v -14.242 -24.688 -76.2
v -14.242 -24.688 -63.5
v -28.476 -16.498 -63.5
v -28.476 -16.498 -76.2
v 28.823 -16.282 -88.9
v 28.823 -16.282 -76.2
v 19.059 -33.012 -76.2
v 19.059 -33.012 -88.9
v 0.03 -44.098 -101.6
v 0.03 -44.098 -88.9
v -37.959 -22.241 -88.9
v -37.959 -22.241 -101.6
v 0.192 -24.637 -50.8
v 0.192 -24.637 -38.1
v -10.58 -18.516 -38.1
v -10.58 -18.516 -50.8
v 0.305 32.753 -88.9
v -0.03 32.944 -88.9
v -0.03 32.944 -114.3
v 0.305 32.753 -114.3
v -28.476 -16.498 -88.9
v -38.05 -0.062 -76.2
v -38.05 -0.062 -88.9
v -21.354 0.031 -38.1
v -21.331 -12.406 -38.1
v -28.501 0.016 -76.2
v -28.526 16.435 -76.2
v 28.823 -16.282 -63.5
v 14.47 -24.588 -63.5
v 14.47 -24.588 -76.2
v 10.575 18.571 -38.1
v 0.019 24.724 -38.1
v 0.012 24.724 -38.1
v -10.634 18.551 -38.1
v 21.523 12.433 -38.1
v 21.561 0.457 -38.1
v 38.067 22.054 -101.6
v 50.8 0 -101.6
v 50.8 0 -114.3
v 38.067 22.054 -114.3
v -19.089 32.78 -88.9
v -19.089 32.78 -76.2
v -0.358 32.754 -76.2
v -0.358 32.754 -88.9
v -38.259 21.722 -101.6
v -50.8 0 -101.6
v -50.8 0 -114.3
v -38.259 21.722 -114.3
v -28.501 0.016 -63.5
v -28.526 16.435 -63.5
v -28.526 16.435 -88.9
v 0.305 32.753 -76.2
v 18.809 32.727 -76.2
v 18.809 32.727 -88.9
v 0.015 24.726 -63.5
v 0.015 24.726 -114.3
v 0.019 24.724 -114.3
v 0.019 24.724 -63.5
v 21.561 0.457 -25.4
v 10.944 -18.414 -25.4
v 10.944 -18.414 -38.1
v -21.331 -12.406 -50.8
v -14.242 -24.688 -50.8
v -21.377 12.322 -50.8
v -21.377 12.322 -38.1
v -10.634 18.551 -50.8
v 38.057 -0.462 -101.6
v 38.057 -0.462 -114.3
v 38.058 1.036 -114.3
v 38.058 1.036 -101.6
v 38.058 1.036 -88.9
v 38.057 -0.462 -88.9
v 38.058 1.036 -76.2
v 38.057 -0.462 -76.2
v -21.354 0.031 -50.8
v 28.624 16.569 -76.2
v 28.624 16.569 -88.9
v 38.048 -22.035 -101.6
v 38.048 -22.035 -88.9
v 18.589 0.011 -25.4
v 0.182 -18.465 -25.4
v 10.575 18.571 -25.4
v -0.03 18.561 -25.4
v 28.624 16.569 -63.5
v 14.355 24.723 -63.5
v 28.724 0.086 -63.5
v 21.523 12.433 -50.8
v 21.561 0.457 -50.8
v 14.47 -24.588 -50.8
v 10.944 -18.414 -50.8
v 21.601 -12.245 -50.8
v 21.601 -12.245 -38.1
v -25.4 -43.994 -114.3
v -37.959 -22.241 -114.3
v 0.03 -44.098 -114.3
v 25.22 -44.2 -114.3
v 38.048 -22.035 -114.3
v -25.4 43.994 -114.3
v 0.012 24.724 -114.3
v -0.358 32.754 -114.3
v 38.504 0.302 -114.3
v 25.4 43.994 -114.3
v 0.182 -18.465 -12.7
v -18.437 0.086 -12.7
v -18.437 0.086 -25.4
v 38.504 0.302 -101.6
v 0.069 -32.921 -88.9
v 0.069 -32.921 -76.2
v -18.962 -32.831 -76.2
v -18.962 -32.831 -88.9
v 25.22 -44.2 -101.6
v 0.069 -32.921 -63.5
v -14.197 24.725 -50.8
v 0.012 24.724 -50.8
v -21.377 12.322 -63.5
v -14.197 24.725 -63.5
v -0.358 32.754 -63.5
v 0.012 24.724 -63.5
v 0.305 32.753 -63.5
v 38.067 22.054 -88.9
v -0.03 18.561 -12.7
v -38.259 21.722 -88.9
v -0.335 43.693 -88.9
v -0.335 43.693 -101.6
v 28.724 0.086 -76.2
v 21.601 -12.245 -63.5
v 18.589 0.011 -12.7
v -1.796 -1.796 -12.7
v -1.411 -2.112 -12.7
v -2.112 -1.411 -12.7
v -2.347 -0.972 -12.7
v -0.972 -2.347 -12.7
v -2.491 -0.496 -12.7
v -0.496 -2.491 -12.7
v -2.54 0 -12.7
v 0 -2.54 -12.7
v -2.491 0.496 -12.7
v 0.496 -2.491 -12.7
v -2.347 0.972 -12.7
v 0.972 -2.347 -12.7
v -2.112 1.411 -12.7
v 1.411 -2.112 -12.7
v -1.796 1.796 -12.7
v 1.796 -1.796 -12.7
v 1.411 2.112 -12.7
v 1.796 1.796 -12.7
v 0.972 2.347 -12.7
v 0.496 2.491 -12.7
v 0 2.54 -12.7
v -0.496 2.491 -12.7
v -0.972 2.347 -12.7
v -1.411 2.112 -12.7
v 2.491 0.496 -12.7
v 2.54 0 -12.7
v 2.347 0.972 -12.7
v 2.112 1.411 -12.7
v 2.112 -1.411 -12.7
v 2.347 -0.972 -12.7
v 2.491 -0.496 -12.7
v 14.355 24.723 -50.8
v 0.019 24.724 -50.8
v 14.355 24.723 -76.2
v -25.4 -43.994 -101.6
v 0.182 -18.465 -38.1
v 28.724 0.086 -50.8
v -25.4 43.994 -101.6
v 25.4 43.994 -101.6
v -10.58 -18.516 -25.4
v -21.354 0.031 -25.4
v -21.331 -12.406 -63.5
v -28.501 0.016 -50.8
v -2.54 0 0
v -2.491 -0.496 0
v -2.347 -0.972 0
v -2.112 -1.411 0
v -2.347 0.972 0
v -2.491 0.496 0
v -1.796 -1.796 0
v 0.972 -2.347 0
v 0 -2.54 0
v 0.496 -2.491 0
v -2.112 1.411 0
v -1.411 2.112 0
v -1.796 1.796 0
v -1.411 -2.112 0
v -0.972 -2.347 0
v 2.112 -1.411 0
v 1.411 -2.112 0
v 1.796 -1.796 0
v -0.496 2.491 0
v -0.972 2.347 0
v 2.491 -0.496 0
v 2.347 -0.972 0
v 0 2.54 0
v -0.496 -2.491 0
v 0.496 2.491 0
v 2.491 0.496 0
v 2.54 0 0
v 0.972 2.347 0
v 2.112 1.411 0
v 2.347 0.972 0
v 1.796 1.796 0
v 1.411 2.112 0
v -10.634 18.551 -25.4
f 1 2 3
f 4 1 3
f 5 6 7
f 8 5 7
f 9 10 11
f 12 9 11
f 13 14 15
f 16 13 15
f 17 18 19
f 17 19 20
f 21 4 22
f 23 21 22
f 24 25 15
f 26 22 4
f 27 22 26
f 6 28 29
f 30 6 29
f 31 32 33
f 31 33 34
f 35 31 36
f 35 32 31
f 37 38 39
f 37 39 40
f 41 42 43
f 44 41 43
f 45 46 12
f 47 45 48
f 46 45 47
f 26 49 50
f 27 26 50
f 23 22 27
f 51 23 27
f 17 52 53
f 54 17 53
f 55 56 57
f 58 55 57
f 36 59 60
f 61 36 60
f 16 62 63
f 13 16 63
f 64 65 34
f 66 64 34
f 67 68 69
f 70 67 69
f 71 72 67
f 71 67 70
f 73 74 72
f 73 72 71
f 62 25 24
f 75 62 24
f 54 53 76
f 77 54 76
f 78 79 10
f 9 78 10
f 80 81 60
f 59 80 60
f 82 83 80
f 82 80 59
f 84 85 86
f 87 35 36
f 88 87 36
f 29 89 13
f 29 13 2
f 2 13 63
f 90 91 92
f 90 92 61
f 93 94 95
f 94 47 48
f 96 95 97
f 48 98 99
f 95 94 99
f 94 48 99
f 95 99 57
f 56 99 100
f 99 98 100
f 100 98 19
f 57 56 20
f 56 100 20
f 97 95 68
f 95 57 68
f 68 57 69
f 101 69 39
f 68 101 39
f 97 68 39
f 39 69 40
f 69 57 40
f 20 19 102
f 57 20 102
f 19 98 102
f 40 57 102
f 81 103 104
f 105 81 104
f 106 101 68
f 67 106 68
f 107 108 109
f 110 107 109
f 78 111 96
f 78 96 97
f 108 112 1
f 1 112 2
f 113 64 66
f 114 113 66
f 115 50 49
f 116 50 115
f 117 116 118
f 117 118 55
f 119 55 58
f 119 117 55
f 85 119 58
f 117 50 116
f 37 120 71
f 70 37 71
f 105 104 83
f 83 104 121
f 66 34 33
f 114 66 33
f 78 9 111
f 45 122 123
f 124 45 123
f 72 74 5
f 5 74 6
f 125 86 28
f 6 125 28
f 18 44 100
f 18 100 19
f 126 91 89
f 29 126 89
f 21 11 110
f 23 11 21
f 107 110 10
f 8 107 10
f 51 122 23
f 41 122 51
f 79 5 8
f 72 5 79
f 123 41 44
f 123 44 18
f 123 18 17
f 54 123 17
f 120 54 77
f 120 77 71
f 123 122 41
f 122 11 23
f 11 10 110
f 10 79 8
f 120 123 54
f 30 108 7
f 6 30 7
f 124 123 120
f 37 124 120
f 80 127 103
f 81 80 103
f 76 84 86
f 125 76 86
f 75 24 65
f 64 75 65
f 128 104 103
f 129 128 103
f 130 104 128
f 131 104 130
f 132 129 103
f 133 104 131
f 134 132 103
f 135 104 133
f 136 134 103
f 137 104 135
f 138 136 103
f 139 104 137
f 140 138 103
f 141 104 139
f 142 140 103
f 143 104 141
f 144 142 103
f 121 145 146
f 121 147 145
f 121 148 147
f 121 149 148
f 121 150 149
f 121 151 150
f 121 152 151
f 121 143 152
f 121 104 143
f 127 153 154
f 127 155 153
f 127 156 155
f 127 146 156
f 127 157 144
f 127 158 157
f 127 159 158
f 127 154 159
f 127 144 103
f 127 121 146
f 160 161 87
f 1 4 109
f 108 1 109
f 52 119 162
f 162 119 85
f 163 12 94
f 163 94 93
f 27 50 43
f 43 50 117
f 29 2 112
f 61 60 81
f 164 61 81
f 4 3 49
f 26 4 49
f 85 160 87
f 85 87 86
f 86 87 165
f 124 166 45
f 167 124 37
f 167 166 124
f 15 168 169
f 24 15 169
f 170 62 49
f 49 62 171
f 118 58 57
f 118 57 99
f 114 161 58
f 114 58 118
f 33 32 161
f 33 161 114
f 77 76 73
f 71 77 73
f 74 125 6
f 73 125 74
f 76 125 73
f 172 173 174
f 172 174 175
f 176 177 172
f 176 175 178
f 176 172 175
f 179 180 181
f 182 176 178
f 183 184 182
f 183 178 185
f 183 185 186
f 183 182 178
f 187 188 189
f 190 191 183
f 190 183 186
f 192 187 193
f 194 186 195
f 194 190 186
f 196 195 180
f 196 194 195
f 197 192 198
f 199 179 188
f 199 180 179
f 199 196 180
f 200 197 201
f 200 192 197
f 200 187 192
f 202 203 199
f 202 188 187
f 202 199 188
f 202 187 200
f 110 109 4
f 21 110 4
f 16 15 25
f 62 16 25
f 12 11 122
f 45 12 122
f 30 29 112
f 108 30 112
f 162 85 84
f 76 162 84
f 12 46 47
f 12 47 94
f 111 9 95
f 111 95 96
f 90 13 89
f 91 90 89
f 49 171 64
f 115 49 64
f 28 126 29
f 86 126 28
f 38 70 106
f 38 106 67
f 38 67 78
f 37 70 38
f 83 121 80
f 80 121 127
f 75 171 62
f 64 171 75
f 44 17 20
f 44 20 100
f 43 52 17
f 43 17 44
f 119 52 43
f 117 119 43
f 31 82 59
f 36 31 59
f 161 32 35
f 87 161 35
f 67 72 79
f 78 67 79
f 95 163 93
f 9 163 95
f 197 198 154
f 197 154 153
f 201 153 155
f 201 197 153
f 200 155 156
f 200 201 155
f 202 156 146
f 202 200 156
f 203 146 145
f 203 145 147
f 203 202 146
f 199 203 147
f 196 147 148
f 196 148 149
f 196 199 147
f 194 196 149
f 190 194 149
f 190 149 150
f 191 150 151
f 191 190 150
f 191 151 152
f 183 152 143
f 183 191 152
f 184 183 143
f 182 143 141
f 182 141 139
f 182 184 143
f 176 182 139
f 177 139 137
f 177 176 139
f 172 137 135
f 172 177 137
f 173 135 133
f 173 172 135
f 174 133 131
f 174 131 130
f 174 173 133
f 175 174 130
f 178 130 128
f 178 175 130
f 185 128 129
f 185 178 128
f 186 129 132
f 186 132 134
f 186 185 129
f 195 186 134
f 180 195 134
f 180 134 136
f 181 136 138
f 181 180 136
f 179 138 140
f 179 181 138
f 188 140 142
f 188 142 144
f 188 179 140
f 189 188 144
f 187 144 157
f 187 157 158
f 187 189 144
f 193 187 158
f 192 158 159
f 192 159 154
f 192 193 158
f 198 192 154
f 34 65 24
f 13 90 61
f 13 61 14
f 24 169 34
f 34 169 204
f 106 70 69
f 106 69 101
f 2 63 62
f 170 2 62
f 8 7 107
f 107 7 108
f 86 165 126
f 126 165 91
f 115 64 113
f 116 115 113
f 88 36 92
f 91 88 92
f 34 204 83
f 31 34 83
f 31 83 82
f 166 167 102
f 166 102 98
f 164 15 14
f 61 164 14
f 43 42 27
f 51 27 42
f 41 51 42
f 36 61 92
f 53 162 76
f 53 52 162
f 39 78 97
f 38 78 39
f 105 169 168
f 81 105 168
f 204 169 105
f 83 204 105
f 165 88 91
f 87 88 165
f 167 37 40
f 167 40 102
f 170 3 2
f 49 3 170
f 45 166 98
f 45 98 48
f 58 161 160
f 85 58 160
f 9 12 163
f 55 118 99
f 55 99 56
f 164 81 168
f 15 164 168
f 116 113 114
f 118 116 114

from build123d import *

# Parameters (mm, degrees)
F0_R     = 2.54
F1_DEPTH = 114.3
F2_DEPTH = 101.6
F3_DEPTH = 88.9
F4_DEPTH = 76.2
F5_DEPTH = 63.5
F6_DEPTH = 50.8
F7_DEPTH = 38.1
F8_DEPTH = 25.4
F9_DEPTH = 12.7


with BuildPart() as f1:
    # F0 (on Top) → F1 (new body)
    with BuildSketch(Plane.XY):
        Polygon((0.0297449546, -44.0977803999), (-37.9594102152, -22.2405539065), (-25.4, -43.9940905122), align=None)
        Polygon((38.0476643122, -22.0353334131), (0.0297449546, -44.0977803999), (25.2201944386, -44.2004945593), align=None)
        Polygon((-0.3350584157, 43.6933898381), (-38.2585494002, 21.7224296395), (-37.9594102152, -22.2405539065), (0.0297449546, -44.0977803999), (38.0476643122, -22.0353334131), (38.0572074327, -0.4624397172), (28.8234651499, -16.2822326428), (19.0586446504, -33.011900152), (0.0689860095, -32.9213402193), (-18.9618453465, -32.8305839378), (-28.4762239518, -16.497728885), (-38.0503063303, -0.0623833689), (-28.5255642951, 16.434953765), (-19.0890015805, 32.7795598355), (-0.3579905366, 32.7538269983), (-0.029694677, 32.9440250808), (0.3047047711, 32.7529165813), (18.8090625796, 32.7274951224), (28.6237113617, 16.568670808), (38.0578704177, 1.0362842578), (38.0671679073, 22.0539121087), align=None)
        Polygon((19.0586446504, -33.011900152), (28.8234651499, -16.2822326428), (14.47040053, -24.5877973202), (0.0689860095, -32.9213402193), align=None)
        Polygon((-18.9618453465, -32.8305839378), (0.0689860095, -32.9213402193), (-14.2417858933, -24.6875750467), (-28.4762239518, -16.497728885), align=None)
        Polygon((0.0689860095, -32.9213402193), (14.47040053, -24.5877973202), (0.1916506856, -24.6374174075), (-14.2417858933, -24.6875750467), align=None)
        Polygon((-14.2417858933, -24.6875750467), (0.1916506856, -24.6374174075), (-10.5802674086, -18.5155618092), (-21.3309908039, -12.4057515018), align=None)
        Polygon((-10.5802674086, -18.5155618092), (0.1916506856, -24.6374174075), (10.9436599796, -18.4137225871), (0.1816962855, -18.4646421982), align=None)
        Polygon((0.1916506856, -24.6374174075), (14.47040053, -24.5877973202), (21.6005177699, -12.2451052788), (10.9436599796, -18.4137225871), align=None)
        Polygon((10.9436599796, -18.4137225871), (21.6005177699, -12.2451052788), (21.5605416369, 0.4568982525), align=None)
        Polygon((10.9436599796, -18.4137225871), (21.5605416369, 0.4568982525), (10.5746748077, 18.5706432099), (-0.029694677, 18.5608677566), (18.5890194076, 0.010555068), (0.1816962855, -18.4646421982), align=None)
        Polygon((14.47040053, -24.5877973202), (28.8234651499, -16.2822326428), (28.7239362394, 0.0859907596), (21.6005177699, -12.2451052788), align=None)
        Polygon((21.6005177699, -12.2451052788), (28.7239362394, 0.0859907596), (21.5228505909, 12.4328389883), (21.5605416369, 0.4568982525), align=None)
        Polygon((38.0572074327, -0.4624397172), (38.0578704177, 1.0362842578), (28.6237113617, 16.568670808), (28.7239362394, 0.0859907596), (28.8234651499, -16.2822326428), align=None)
        Polygon((28.7239362394, 0.0859907596), (28.6237113617, 16.568670808), (14.3545600969, 24.7234572518), (21.5228505909, 12.4328389883), align=None)
        Polygon((14.3545600969, 24.7234572518), (28.6237113617, 16.568670808), (18.8090625796, 32.7274951224), (0.3047047711, 32.7529165813), align=None)
        Polygon((-28.5255642951, 16.434953765), (-0.3579905366, 32.7538269983), (-19.0890015805, 32.7795598355), align=None)
        Polygon((0.0185433098, 24.7241456127), (14.3545600969, 24.7234572518), (0.3047047711, 32.7529165813), (-0.3579905366, 32.7538269983), (-28.5255642951, 16.434953765), (-28.5009651241, 0.0160024937), (-21.37674811, 12.3222678023), (-14.1967849419, 24.7248281787), (0.0124332375, 24.7241459061), (0.0154661396, 24.7259044438), align=None)
        Polygon((-10.6340641617, 18.5510923033), (0.0124332375, 24.7241459061), (-14.1967849419, 24.7248281787), (-21.37674811, 12.3222678023), align=None)
        Polygon((-21.3540038347, 0.0308781616), (-10.6340641617, 18.5510923033), (-21.37674811, 12.3222678023), align=None)
        Polygon((-21.3540038347, 0.0308781616), (-10.5802674086, -18.5155618092), (0.1816962855, -18.4646421982), (-18.437017799, 0.0856704905), (-0.029694677, 18.5608677566), (-10.6340641617, 18.5510923033), align=None)
        Polygon((-18.437017799, 0.0856704905), (0.1816962855, -18.4646421982), (18.5890194076, 0.010555068), (-0.029694677, 18.5608677566), align=None)
        Circle(F0_R, mode=Mode.SUBTRACT)
        Circle(F0_R)
        Polygon((21.5228505909, 12.4328389883), (14.3545600969, 24.7234572518), (0.0185433098, 24.7241456127), align=None)
        Polygon((21.5228505909, 12.4328389883), (0.0185433098, 24.7241456127), (0.0124332375, 24.7241459061), (-10.6340641617, 18.5510923033), (-0.029694677, 18.5608677566), (10.5746748077, 18.5706432099), (21.5605416369, 0.4568982525), align=None)
        Polygon((-28.5009651241, 0.0160024937), (-28.5255642951, 16.434953765), (-38.0503063303, -0.0623833689), (-28.4762239518, -16.497728885), align=None)
        Polygon((-28.4762239518, -16.497728885), (-14.2417858933, -24.6875750467), (-21.3309908039, -12.4057515018), (-28.5009651241, 0.0160024937), align=None)
        Polygon((-28.5009651241, 0.0160024937), (-21.3309908039, -12.4057515018), (-21.3540038347, 0.0308781616), (-21.37674811, 12.3222678023), align=None)
        Polygon((-21.3309908039, -12.4057515018), (-10.5802674086, -18.5155618092), (-21.3540038347, 0.0308781616), align=None)
        Polygon((-37.9594102152, -22.2405539065), (-38.2585494002, 21.7224296395), (-50.8, 0), align=None)
        Polygon((50.8, 0), (38.0671679073, 22.0539121087), (38.0578704177, 1.0362842578), (38.503626573, 0.3023919341), (38.0572074327, -0.4624397172), (38.0476643122, -22.0353334131), align=None)
        Polygon((25.4, 43.9940905122), (-25.4, 43.9940905122), (-38.2585494002, 21.7224296395), (-0.3350584157, 43.6933898381), (38.0671679073, 22.0539121087), align=None)
    extrude(amount=-F1_DEPTH)

    # F0 (on Top) → F2 (cut)
    with BuildSketch(Plane.XY):
        Polygon((25.4, 43.9940905122), (-25.4, 43.9940905122), (-38.2585494002, 21.7224296395), (-0.3350584157, 43.6933898381), (38.0671679073, 22.0539121087), align=None)
        Polygon((38.0476643122, -22.0353334131), (0.0297449546, -44.0977803999), (25.2201944386, -44.2004945593), align=None)
        Polygon((0.0297449546, -44.0977803999), (-37.9594102152, -22.2405539065), (-25.4, -43.9940905122), align=None)
        Polygon((-37.9594102152, -22.2405539065), (-38.2585494002, 21.7224296395), (-50.8, 0), align=None)
        Polygon((50.8, 0), (38.0671679073, 22.0539121087), (38.0578704177, 1.0362842578), (38.503626573, 0.3023919341), (38.0572074327, -0.4624397172), (38.0476643122, -22.0353334131), align=None)
    extrude(amount=-F2_DEPTH, mode=Mode.SUBTRACT)

    # F0 (on Top) → F3 (cut)
    with BuildSketch(Plane.XY):
        Polygon((-0.3350584157, 43.6933898381), (-38.2585494002, 21.7224296395), (-37.9594102152, -22.2405539065), (0.0297449546, -44.0977803999), (38.0476643122, -22.0353334131), (38.0572074327, -0.4624397172), (28.8234651499, -16.2822326428), (19.0586446504, -33.011900152), (0.0689860095, -32.9213402193), (-18.9618453465, -32.8305839378), (-28.4762239518, -16.497728885), (-38.0503063303, -0.0623833689), (-28.5255642951, 16.434953765), (-19.0890015805, 32.7795598355), (-0.3579905366, 32.7538269983), (-0.029694677, 32.9440250808), (0.3047047711, 32.7529165813), (18.8090625796, 32.7274951224), (28.6237113617, 16.568670808), (38.0578704177, 1.0362842578), (38.0671679073, 22.0539121087), align=None)
    extrude(amount=-F3_DEPTH, mode=Mode.SUBTRACT)

    # F0 (on Top) → F4 (cut)
    with BuildSketch(Plane.XY):
        Polygon((-18.9618453465, -32.8305839378), (0.0689860095, -32.9213402193), (-14.2417858933, -24.6875750467), (-28.4762239518, -16.497728885), align=None)
        Polygon((19.0586446504, -33.011900152), (28.8234651499, -16.2822326428), (14.47040053, -24.5877973202), (0.0689860095, -32.9213402193), align=None)
        Polygon((38.0572074327, -0.4624397172), (38.0578704177, 1.0362842578), (28.6237113617, 16.568670808), (28.7239362394, 0.0859907596), (28.8234651499, -16.2822326428), align=None)
        Polygon((14.3545600969, 24.7234572518), (28.6237113617, 16.568670808), (18.8090625796, 32.7274951224), (0.3047047711, 32.7529165813), align=None)
        Polygon((-28.5255642951, 16.434953765), (-0.3579905366, 32.7538269983), (-19.0890015805, 32.7795598355), align=None)
        Polygon((-28.5009651241, 0.0160024937), (-28.5255642951, 16.434953765), (-38.0503063303, -0.0623833689), (-28.4762239518, -16.497728885), align=None)
    extrude(amount=-F4_DEPTH, mode=Mode.SUBTRACT)

    # F0 (on Top) → F5 (cut)
    with BuildSketch(Plane.XY):
        Polygon((0.0185433098, 24.7241456127), (14.3545600969, 24.7234572518), (0.3047047711, 32.7529165813), (-0.3579905366, 32.7538269983), (-28.5255642951, 16.434953765), (-28.5009651241, 0.0160024937), (-21.37674811, 12.3222678023), (-14.1967849419, 24.7248281787), (0.0124332375, 24.7241459061), (0.0154661396, 24.7259044438), align=None)
        Polygon((28.7239362394, 0.0859907596), (28.6237113617, 16.568670808), (14.3545600969, 24.7234572518), (21.5228505909, 12.4328389883), align=None)
        Polygon((14.47040053, -24.5877973202), (28.8234651499, -16.2822326428), (28.7239362394, 0.0859907596), (21.6005177699, -12.2451052788), align=None)
        Polygon((0.0689860095, -32.9213402193), (14.47040053, -24.5877973202), (0.1916506856, -24.6374174075), (-14.2417858933, -24.6875750467), align=None)
        Polygon((-28.4762239518, -16.497728885), (-14.2417858933, -24.6875750467), (-21.3309908039, -12.4057515018), (-28.5009651241, 0.0160024937), align=None)
    extrude(amount=-F5_DEPTH, mode=Mode.SUBTRACT)

    # F0 (on Top) → F6 (cut)
    with BuildSketch(Plane.XY):
        Polygon((-10.6340641617, 18.5510923033), (0.0124332375, 24.7241459061), (-14.1967849419, 24.7248281787), (-21.37674811, 12.3222678023), align=None)
        Polygon((21.5228505909, 12.4328389883), (14.3545600969, 24.7234572518), (0.0185433098, 24.7241456127), align=None)
        Polygon((-28.5009651241, 0.0160024937), (-21.3309908039, -12.4057515018), (-21.3540038347, 0.0308781616), (-21.37674811, 12.3222678023), align=None)
        Polygon((-14.2417858933, -24.6875750467), (0.1916506856, -24.6374174075), (-10.5802674086, -18.5155618092), (-21.3309908039, -12.4057515018), align=None)
        Polygon((0.1916506856, -24.6374174075), (14.47040053, -24.5877973202), (21.6005177699, -12.2451052788), (10.9436599796, -18.4137225871), align=None)
        Polygon((21.6005177699, -12.2451052788), (28.7239362394, 0.0859907596), (21.5228505909, 12.4328389883), (21.5605416369, 0.4568982525), align=None)
    extrude(amount=-F6_DEPTH, mode=Mode.SUBTRACT)

    # F0 (on Top) → F7 (cut)
    with BuildSketch(Plane.XY):
        Polygon((-21.3540038347, 0.0308781616), (-10.6340641617, 18.5510923033), (-21.37674811, 12.3222678023), align=None)
        Polygon((21.5228505909, 12.4328389883), (0.0185433098, 24.7241456127), (0.0124332375, 24.7241459061), (-10.6340641617, 18.5510923033), (-0.029694677, 18.5608677566), (10.5746748077, 18.5706432099), (21.5605416369, 0.4568982525), align=None)
        Polygon((10.9436599796, -18.4137225871), (21.6005177699, -12.2451052788), (21.5605416369, 0.4568982525), align=None)
        Polygon((-10.5802674086, -18.5155618092), (0.1916506856, -24.6374174075), (10.9436599796, -18.4137225871), (0.1816962855, -18.4646421982), align=None)
        Polygon((-21.3309908039, -12.4057515018), (-10.5802674086, -18.5155618092), (-21.3540038347, 0.0308781616), align=None)
    extrude(amount=-F7_DEPTH, mode=Mode.SUBTRACT)

    # F0 (on Top) → F8 (cut)
    with BuildSketch(Plane.XY):
        Polygon((-21.3540038347, 0.0308781616), (-10.5802674086, -18.5155618092), (0.1816962855, -18.4646421982), (-18.437017799, 0.0856704905), (-0.029694677, 18.5608677566), (-10.6340641617, 18.5510923033), align=None)
        Polygon((10.9436599796, -18.4137225871), (21.5605416369, 0.4568982525), (10.5746748077, 18.5706432099), (-0.029694677, 18.5608677566), (18.5890194076, 0.010555068), (0.1816962855, -18.4646421982), align=None)
    extrude(amount=-F8_DEPTH, mode=Mode.SUBTRACT)

    # F0 (on Top) → F9 (cut)
    with BuildSketch(Plane.XY):
        Polygon((-18.437017799, 0.0856704905), (0.1816962855, -18.4646421982), (18.5890194076, 0.010555068), (-0.029694677, 18.5608677566), align=None)
        Circle(F0_R, mode=Mode.SUBTRACT)
    extrude(amount=-F9_DEPTH, mode=Mode.SUBTRACT)


solid = f1.part
